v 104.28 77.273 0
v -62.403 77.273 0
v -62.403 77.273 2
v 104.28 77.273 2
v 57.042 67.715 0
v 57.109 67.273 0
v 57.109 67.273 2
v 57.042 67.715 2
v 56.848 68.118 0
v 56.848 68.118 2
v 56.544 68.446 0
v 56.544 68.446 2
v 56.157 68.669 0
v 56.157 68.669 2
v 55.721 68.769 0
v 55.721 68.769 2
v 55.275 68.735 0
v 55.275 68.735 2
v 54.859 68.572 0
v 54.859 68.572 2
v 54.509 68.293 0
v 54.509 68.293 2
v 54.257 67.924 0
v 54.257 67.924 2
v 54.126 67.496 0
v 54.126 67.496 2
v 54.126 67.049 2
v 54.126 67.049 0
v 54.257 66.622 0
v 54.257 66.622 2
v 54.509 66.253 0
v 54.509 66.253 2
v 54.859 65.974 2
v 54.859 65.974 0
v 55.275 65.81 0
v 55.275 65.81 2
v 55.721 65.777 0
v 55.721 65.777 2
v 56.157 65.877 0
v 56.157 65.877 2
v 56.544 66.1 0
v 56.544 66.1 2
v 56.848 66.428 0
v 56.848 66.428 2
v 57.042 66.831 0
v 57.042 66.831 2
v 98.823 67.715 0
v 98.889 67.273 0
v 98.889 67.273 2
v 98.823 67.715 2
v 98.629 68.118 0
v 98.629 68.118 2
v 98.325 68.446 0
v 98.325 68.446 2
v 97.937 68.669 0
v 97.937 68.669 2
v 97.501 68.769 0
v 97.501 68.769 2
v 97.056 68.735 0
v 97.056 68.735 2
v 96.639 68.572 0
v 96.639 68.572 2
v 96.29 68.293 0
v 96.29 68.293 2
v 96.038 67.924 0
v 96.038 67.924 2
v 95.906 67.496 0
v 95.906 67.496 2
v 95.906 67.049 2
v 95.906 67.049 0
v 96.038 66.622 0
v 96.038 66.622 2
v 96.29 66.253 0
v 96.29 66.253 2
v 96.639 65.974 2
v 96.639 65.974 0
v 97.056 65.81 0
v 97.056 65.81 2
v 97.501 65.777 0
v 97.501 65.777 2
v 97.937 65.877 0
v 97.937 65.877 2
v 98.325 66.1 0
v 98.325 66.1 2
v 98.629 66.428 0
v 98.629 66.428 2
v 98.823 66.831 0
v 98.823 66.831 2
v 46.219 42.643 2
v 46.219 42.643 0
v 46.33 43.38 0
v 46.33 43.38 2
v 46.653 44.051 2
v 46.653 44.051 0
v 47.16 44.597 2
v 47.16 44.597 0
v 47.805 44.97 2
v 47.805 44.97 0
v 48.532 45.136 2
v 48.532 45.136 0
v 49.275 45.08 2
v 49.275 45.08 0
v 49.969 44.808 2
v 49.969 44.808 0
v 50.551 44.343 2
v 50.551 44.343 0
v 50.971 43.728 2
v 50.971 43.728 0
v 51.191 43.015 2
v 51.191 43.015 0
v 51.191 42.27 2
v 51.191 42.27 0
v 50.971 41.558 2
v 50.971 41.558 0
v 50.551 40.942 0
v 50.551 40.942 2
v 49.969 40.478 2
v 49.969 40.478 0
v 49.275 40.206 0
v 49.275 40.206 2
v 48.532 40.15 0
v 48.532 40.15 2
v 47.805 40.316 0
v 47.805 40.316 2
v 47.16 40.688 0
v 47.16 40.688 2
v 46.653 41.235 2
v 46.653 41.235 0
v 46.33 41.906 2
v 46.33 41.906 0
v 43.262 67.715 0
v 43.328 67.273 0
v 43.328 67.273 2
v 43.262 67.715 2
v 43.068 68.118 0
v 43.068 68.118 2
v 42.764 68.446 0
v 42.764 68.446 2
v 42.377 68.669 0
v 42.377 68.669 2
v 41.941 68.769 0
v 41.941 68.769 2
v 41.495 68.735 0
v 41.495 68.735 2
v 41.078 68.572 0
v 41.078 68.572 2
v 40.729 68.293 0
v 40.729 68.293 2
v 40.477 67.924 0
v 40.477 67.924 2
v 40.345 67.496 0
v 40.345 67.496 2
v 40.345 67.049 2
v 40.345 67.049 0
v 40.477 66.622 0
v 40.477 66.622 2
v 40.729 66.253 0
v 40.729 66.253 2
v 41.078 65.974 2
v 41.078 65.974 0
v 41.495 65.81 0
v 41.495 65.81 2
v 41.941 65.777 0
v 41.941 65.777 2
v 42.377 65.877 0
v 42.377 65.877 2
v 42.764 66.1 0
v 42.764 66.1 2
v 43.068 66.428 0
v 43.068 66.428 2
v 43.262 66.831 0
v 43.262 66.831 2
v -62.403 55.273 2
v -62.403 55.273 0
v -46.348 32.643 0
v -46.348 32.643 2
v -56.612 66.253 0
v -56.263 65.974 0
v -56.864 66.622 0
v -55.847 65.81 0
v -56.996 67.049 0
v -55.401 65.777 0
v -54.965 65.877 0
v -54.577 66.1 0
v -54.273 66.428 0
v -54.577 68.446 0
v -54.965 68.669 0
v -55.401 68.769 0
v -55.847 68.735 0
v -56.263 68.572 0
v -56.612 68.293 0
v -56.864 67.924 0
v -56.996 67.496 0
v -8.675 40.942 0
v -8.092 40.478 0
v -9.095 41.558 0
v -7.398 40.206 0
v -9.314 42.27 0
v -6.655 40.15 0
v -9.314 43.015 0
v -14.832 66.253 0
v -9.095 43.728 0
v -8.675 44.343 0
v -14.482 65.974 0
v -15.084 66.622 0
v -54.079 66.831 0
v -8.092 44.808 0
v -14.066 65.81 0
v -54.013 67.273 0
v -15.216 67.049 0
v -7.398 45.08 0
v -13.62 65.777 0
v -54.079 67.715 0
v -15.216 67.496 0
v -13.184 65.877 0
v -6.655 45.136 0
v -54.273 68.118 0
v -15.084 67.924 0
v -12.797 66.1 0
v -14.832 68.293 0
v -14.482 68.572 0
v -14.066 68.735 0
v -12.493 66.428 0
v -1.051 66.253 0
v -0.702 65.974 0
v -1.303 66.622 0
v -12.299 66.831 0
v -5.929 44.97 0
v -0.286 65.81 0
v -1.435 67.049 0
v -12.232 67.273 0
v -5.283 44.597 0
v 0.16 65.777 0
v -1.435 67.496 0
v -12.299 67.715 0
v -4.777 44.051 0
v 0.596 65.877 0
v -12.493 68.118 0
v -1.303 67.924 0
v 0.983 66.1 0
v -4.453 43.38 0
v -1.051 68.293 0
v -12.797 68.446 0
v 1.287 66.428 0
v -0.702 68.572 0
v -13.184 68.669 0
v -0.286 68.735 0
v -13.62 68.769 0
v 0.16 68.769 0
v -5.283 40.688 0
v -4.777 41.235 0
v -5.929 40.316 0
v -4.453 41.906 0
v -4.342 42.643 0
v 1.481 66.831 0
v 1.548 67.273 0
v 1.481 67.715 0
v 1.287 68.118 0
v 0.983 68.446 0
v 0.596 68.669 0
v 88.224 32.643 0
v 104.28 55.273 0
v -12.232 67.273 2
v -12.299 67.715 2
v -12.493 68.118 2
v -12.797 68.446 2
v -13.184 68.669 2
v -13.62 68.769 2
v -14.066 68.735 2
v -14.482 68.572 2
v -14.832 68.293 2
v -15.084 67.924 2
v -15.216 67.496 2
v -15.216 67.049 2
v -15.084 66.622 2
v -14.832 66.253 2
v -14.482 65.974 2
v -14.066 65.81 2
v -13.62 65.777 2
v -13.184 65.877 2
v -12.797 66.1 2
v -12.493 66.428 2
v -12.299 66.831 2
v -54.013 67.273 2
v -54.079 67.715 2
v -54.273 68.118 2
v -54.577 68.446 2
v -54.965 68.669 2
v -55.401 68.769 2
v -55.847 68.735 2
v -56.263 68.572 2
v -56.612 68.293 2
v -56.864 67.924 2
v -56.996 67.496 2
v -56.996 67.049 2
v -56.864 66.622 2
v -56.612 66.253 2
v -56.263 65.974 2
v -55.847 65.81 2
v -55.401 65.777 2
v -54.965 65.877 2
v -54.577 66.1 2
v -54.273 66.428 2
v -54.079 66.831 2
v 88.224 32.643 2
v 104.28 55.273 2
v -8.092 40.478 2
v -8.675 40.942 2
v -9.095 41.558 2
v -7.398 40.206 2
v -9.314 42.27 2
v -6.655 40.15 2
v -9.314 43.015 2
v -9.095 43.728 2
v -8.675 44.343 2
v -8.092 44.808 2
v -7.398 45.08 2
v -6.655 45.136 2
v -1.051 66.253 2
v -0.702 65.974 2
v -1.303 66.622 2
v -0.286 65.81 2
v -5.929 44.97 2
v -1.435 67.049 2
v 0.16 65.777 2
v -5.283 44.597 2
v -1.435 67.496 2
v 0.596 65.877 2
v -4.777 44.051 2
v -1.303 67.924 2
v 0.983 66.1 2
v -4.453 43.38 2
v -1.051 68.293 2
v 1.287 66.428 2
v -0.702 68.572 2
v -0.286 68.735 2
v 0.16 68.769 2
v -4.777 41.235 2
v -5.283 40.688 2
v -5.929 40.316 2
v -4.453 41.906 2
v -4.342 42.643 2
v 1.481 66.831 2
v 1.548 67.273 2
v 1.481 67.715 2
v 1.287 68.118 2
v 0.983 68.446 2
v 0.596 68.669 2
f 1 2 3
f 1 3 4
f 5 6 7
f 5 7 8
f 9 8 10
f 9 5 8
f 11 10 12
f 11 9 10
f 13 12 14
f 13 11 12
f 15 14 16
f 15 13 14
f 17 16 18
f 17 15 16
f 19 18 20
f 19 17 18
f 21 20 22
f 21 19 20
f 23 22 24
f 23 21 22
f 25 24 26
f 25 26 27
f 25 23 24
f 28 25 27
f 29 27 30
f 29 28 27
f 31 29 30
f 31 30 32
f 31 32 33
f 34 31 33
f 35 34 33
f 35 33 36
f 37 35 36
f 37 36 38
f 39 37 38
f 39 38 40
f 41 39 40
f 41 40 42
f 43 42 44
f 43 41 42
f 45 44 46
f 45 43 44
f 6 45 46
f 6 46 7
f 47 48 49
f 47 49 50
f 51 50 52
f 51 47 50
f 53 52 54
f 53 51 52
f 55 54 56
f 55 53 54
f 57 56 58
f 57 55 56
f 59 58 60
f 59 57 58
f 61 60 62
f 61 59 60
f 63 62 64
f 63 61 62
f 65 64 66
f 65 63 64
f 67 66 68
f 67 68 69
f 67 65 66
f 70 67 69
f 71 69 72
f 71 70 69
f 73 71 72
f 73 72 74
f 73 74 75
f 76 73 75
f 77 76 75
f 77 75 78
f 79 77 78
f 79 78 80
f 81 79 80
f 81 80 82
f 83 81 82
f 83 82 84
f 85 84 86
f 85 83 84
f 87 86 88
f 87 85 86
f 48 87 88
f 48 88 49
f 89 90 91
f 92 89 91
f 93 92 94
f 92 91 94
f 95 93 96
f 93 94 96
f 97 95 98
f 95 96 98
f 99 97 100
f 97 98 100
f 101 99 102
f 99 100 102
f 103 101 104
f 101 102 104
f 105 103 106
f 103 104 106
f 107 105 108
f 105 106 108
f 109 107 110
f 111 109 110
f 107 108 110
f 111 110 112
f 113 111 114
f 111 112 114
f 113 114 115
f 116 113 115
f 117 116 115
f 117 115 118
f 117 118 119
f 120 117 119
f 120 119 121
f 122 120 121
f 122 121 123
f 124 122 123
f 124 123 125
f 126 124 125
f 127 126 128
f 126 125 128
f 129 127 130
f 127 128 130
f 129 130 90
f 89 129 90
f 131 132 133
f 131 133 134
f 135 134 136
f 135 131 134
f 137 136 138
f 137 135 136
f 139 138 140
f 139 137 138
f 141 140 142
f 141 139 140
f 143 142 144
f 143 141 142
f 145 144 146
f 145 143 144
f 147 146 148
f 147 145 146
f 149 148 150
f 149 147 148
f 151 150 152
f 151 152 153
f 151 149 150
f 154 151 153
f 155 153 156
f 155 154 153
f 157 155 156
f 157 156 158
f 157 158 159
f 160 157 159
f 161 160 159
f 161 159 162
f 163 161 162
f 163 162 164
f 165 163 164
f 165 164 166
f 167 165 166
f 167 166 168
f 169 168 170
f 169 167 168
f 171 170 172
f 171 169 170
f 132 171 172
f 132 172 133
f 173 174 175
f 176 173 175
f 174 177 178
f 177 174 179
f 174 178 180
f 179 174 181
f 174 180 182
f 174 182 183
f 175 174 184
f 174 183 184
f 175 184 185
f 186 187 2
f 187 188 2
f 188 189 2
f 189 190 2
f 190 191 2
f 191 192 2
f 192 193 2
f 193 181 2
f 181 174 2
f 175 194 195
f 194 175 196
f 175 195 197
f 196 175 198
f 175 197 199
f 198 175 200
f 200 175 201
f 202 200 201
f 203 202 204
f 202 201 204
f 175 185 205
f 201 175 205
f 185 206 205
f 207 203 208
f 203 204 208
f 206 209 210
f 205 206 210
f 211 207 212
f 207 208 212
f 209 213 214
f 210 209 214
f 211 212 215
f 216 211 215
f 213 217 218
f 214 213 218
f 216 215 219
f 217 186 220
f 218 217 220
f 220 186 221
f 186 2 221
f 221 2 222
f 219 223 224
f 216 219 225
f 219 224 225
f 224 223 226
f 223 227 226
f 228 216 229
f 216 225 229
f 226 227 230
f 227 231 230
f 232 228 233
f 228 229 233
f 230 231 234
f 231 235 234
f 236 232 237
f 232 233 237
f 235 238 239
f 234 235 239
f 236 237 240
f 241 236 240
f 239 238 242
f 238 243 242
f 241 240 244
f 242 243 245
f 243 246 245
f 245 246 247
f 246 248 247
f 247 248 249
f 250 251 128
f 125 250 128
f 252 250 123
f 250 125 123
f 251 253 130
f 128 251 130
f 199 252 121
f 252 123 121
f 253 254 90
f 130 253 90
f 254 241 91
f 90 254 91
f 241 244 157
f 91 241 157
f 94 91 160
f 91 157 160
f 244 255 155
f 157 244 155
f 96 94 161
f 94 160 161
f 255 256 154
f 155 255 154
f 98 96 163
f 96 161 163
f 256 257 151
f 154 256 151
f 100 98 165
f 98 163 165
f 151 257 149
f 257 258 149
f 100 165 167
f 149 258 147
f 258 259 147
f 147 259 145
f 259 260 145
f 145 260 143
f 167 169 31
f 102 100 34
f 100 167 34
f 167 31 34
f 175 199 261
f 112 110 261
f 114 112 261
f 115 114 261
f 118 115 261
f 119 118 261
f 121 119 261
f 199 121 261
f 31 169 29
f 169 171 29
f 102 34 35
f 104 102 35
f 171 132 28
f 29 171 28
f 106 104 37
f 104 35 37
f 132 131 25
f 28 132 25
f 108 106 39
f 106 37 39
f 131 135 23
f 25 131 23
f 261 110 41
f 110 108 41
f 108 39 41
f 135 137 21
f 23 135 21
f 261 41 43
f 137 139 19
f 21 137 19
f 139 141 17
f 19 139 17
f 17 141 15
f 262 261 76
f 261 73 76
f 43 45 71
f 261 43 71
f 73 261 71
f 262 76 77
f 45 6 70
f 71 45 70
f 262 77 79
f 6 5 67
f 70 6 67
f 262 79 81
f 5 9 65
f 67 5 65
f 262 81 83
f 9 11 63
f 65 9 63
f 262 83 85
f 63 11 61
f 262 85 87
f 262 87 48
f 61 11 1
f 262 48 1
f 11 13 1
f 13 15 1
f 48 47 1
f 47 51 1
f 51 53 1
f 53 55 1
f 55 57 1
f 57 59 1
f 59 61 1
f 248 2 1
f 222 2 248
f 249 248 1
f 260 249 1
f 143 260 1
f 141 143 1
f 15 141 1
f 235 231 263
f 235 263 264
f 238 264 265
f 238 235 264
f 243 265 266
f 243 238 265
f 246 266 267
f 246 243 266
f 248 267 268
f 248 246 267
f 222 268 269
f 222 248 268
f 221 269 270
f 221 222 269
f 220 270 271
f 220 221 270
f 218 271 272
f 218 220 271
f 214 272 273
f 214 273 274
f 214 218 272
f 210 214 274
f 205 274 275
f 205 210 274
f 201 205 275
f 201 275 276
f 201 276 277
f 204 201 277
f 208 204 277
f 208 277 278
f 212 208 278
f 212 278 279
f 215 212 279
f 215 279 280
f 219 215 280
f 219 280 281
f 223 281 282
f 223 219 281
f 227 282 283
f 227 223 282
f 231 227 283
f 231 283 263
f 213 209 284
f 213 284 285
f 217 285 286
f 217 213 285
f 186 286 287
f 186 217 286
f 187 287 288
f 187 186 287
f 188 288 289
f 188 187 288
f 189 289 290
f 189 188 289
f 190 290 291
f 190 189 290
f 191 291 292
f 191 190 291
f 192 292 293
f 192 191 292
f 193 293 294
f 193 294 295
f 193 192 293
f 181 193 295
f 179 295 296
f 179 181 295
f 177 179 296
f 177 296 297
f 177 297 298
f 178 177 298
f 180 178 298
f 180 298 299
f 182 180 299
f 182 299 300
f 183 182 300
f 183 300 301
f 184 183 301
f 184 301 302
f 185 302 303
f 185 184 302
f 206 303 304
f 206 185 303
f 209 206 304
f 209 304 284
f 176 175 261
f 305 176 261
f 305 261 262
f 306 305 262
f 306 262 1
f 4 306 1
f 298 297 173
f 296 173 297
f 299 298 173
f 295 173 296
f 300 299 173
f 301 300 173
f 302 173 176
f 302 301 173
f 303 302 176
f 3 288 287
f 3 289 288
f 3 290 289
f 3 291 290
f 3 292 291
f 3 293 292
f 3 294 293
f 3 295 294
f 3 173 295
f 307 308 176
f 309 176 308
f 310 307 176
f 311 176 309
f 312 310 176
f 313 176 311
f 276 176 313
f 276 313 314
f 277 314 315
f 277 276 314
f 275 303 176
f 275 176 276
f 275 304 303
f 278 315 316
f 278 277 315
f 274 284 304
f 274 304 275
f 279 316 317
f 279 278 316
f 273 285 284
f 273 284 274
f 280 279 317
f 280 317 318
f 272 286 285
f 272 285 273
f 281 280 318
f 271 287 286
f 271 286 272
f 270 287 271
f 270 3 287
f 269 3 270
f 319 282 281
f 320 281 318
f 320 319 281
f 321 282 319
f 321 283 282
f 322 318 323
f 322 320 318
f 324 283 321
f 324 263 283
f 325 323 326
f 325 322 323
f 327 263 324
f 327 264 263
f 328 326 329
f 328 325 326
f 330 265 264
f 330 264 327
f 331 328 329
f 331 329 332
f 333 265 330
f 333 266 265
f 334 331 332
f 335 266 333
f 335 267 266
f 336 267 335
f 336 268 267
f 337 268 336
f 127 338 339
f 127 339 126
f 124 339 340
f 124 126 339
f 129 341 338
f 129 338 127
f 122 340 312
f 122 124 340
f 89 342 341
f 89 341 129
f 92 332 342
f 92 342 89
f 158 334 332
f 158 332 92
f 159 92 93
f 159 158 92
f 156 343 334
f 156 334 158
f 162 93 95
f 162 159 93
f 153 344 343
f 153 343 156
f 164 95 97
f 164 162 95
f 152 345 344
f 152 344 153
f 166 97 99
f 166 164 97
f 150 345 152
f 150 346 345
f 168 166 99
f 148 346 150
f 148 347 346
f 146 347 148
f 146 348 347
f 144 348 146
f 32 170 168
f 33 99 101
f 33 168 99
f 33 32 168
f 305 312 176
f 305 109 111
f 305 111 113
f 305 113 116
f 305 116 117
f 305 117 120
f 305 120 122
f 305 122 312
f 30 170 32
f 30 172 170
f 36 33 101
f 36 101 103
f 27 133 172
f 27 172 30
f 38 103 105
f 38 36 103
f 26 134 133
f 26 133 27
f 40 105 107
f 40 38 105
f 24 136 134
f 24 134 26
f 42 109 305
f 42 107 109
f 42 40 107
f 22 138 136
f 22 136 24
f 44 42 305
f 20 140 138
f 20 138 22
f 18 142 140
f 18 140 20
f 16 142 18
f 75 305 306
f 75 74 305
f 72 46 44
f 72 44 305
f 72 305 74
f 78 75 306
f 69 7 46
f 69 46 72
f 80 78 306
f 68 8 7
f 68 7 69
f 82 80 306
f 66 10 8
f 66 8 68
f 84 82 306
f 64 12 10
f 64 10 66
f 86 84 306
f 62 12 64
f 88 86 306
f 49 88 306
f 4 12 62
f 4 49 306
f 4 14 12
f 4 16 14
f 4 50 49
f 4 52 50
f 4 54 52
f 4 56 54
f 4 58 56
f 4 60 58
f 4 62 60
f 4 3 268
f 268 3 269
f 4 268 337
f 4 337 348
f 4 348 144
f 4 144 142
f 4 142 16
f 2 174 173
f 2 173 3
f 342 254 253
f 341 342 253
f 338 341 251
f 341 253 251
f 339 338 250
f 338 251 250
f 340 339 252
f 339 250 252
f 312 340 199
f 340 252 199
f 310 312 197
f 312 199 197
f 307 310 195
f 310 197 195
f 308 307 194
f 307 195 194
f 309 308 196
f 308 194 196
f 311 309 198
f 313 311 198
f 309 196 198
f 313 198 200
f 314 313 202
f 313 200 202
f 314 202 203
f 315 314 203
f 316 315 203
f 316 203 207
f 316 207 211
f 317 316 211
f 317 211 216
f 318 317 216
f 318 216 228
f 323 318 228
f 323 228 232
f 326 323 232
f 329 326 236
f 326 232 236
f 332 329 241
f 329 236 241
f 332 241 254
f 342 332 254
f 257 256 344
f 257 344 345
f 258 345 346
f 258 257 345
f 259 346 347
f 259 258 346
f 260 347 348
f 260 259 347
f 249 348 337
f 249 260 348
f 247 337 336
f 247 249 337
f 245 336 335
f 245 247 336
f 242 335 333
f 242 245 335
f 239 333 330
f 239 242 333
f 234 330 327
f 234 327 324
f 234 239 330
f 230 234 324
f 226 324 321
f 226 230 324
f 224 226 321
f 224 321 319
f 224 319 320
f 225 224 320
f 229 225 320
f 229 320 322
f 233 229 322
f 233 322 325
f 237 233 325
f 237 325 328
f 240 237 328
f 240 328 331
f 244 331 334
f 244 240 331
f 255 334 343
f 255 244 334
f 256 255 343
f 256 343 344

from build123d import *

# Parameters (mm, degrees)
SKETCH1_W           = 55.560809748
SKETCH1_H           = 22
SKETCH1_R           = 1.5
BOSS_EXTRUDE1_DEPTH = 2
SKETCH3_R           = 2.5
CUT_EXTRUDE1_DEPTH  = 2


with BuildPart() as part:
    # Sketch1 → Boss-Extrude1 (new body)
    # profile 1 of 4: a face of its own
    with BuildSketch(Plane.XY):
        Polygon((-62.402927025, 55.272853248), (-46.347522151, 32.642853248), (-22.897522151, 32.642853248), (88.224097345, 32.642853248), (104.279502219, 55.272853248), (48.718692471, 55.272853248), (-6.842117277, 55.272853248), align=None)
    # profile 2 of 4: a face of its own
    with BuildSketch(Plane.XY):
        with Locations((-34.622522151, 66.272853248)):
            Rectangle(SKETCH1_W, SKETCH1_H)
        with Locations((-55.512724588, 67.272853248)):
            Circle(SKETCH1_R, mode=Mode.SUBTRACT)
        with Locations((-13.732319714, 67.272853248)):
            Circle(SKETCH1_R, mode=Mode.SUBTRACT)
    # profile 3 of 4: a face of its own
    with BuildSketch(Plane.XY):
        with Locations((20.938287597, 66.272853248)):
            Rectangle(SKETCH1_W, SKETCH1_H)
        with Locations((0.04808516, 67.272853248)):
            Circle(SKETCH1_R, mode=Mode.SUBTRACT)
        with Locations((41.828490034, 67.272853248)):
            Circle(SKETCH1_R, mode=Mode.SUBTRACT)
    # profile 4 of 4: a face of its own
    with BuildSketch(Plane.XY):
        with Locations((76.499097345, 66.272853248)):
            Rectangle(SKETCH1_W, SKETCH1_H)
        with Locations((55.608894908, 67.272853248)):
            Circle(SKETCH1_R, mode=Mode.SUBTRACT)
        with Locations((97.389299782, 67.272853248)):
            Circle(SKETCH1_R, mode=Mode.SUBTRACT)
    extrude(amount=BOSS_EXTRUDE1_DEPTH)

    # Sketch3 → Cut-Extrude1 (cut)
    with BuildSketch(Plane(origin=(0, 0, 0), x_dir=(-1, 0, 0), z_dir=(0, 0, -1))):
        with Locations((-48.718692471, 42.642853248)):
            Circle(SKETCH3_R)
        with Locations(Location((6.842117277, 42.642853248, 0), (0, 0, 180))):
            Circle(SKETCH3_R)
    extrude(amount=-CUT_EXTRUDE1_DEPTH, mode=Mode.SUBTRACT)


solid = part.part
